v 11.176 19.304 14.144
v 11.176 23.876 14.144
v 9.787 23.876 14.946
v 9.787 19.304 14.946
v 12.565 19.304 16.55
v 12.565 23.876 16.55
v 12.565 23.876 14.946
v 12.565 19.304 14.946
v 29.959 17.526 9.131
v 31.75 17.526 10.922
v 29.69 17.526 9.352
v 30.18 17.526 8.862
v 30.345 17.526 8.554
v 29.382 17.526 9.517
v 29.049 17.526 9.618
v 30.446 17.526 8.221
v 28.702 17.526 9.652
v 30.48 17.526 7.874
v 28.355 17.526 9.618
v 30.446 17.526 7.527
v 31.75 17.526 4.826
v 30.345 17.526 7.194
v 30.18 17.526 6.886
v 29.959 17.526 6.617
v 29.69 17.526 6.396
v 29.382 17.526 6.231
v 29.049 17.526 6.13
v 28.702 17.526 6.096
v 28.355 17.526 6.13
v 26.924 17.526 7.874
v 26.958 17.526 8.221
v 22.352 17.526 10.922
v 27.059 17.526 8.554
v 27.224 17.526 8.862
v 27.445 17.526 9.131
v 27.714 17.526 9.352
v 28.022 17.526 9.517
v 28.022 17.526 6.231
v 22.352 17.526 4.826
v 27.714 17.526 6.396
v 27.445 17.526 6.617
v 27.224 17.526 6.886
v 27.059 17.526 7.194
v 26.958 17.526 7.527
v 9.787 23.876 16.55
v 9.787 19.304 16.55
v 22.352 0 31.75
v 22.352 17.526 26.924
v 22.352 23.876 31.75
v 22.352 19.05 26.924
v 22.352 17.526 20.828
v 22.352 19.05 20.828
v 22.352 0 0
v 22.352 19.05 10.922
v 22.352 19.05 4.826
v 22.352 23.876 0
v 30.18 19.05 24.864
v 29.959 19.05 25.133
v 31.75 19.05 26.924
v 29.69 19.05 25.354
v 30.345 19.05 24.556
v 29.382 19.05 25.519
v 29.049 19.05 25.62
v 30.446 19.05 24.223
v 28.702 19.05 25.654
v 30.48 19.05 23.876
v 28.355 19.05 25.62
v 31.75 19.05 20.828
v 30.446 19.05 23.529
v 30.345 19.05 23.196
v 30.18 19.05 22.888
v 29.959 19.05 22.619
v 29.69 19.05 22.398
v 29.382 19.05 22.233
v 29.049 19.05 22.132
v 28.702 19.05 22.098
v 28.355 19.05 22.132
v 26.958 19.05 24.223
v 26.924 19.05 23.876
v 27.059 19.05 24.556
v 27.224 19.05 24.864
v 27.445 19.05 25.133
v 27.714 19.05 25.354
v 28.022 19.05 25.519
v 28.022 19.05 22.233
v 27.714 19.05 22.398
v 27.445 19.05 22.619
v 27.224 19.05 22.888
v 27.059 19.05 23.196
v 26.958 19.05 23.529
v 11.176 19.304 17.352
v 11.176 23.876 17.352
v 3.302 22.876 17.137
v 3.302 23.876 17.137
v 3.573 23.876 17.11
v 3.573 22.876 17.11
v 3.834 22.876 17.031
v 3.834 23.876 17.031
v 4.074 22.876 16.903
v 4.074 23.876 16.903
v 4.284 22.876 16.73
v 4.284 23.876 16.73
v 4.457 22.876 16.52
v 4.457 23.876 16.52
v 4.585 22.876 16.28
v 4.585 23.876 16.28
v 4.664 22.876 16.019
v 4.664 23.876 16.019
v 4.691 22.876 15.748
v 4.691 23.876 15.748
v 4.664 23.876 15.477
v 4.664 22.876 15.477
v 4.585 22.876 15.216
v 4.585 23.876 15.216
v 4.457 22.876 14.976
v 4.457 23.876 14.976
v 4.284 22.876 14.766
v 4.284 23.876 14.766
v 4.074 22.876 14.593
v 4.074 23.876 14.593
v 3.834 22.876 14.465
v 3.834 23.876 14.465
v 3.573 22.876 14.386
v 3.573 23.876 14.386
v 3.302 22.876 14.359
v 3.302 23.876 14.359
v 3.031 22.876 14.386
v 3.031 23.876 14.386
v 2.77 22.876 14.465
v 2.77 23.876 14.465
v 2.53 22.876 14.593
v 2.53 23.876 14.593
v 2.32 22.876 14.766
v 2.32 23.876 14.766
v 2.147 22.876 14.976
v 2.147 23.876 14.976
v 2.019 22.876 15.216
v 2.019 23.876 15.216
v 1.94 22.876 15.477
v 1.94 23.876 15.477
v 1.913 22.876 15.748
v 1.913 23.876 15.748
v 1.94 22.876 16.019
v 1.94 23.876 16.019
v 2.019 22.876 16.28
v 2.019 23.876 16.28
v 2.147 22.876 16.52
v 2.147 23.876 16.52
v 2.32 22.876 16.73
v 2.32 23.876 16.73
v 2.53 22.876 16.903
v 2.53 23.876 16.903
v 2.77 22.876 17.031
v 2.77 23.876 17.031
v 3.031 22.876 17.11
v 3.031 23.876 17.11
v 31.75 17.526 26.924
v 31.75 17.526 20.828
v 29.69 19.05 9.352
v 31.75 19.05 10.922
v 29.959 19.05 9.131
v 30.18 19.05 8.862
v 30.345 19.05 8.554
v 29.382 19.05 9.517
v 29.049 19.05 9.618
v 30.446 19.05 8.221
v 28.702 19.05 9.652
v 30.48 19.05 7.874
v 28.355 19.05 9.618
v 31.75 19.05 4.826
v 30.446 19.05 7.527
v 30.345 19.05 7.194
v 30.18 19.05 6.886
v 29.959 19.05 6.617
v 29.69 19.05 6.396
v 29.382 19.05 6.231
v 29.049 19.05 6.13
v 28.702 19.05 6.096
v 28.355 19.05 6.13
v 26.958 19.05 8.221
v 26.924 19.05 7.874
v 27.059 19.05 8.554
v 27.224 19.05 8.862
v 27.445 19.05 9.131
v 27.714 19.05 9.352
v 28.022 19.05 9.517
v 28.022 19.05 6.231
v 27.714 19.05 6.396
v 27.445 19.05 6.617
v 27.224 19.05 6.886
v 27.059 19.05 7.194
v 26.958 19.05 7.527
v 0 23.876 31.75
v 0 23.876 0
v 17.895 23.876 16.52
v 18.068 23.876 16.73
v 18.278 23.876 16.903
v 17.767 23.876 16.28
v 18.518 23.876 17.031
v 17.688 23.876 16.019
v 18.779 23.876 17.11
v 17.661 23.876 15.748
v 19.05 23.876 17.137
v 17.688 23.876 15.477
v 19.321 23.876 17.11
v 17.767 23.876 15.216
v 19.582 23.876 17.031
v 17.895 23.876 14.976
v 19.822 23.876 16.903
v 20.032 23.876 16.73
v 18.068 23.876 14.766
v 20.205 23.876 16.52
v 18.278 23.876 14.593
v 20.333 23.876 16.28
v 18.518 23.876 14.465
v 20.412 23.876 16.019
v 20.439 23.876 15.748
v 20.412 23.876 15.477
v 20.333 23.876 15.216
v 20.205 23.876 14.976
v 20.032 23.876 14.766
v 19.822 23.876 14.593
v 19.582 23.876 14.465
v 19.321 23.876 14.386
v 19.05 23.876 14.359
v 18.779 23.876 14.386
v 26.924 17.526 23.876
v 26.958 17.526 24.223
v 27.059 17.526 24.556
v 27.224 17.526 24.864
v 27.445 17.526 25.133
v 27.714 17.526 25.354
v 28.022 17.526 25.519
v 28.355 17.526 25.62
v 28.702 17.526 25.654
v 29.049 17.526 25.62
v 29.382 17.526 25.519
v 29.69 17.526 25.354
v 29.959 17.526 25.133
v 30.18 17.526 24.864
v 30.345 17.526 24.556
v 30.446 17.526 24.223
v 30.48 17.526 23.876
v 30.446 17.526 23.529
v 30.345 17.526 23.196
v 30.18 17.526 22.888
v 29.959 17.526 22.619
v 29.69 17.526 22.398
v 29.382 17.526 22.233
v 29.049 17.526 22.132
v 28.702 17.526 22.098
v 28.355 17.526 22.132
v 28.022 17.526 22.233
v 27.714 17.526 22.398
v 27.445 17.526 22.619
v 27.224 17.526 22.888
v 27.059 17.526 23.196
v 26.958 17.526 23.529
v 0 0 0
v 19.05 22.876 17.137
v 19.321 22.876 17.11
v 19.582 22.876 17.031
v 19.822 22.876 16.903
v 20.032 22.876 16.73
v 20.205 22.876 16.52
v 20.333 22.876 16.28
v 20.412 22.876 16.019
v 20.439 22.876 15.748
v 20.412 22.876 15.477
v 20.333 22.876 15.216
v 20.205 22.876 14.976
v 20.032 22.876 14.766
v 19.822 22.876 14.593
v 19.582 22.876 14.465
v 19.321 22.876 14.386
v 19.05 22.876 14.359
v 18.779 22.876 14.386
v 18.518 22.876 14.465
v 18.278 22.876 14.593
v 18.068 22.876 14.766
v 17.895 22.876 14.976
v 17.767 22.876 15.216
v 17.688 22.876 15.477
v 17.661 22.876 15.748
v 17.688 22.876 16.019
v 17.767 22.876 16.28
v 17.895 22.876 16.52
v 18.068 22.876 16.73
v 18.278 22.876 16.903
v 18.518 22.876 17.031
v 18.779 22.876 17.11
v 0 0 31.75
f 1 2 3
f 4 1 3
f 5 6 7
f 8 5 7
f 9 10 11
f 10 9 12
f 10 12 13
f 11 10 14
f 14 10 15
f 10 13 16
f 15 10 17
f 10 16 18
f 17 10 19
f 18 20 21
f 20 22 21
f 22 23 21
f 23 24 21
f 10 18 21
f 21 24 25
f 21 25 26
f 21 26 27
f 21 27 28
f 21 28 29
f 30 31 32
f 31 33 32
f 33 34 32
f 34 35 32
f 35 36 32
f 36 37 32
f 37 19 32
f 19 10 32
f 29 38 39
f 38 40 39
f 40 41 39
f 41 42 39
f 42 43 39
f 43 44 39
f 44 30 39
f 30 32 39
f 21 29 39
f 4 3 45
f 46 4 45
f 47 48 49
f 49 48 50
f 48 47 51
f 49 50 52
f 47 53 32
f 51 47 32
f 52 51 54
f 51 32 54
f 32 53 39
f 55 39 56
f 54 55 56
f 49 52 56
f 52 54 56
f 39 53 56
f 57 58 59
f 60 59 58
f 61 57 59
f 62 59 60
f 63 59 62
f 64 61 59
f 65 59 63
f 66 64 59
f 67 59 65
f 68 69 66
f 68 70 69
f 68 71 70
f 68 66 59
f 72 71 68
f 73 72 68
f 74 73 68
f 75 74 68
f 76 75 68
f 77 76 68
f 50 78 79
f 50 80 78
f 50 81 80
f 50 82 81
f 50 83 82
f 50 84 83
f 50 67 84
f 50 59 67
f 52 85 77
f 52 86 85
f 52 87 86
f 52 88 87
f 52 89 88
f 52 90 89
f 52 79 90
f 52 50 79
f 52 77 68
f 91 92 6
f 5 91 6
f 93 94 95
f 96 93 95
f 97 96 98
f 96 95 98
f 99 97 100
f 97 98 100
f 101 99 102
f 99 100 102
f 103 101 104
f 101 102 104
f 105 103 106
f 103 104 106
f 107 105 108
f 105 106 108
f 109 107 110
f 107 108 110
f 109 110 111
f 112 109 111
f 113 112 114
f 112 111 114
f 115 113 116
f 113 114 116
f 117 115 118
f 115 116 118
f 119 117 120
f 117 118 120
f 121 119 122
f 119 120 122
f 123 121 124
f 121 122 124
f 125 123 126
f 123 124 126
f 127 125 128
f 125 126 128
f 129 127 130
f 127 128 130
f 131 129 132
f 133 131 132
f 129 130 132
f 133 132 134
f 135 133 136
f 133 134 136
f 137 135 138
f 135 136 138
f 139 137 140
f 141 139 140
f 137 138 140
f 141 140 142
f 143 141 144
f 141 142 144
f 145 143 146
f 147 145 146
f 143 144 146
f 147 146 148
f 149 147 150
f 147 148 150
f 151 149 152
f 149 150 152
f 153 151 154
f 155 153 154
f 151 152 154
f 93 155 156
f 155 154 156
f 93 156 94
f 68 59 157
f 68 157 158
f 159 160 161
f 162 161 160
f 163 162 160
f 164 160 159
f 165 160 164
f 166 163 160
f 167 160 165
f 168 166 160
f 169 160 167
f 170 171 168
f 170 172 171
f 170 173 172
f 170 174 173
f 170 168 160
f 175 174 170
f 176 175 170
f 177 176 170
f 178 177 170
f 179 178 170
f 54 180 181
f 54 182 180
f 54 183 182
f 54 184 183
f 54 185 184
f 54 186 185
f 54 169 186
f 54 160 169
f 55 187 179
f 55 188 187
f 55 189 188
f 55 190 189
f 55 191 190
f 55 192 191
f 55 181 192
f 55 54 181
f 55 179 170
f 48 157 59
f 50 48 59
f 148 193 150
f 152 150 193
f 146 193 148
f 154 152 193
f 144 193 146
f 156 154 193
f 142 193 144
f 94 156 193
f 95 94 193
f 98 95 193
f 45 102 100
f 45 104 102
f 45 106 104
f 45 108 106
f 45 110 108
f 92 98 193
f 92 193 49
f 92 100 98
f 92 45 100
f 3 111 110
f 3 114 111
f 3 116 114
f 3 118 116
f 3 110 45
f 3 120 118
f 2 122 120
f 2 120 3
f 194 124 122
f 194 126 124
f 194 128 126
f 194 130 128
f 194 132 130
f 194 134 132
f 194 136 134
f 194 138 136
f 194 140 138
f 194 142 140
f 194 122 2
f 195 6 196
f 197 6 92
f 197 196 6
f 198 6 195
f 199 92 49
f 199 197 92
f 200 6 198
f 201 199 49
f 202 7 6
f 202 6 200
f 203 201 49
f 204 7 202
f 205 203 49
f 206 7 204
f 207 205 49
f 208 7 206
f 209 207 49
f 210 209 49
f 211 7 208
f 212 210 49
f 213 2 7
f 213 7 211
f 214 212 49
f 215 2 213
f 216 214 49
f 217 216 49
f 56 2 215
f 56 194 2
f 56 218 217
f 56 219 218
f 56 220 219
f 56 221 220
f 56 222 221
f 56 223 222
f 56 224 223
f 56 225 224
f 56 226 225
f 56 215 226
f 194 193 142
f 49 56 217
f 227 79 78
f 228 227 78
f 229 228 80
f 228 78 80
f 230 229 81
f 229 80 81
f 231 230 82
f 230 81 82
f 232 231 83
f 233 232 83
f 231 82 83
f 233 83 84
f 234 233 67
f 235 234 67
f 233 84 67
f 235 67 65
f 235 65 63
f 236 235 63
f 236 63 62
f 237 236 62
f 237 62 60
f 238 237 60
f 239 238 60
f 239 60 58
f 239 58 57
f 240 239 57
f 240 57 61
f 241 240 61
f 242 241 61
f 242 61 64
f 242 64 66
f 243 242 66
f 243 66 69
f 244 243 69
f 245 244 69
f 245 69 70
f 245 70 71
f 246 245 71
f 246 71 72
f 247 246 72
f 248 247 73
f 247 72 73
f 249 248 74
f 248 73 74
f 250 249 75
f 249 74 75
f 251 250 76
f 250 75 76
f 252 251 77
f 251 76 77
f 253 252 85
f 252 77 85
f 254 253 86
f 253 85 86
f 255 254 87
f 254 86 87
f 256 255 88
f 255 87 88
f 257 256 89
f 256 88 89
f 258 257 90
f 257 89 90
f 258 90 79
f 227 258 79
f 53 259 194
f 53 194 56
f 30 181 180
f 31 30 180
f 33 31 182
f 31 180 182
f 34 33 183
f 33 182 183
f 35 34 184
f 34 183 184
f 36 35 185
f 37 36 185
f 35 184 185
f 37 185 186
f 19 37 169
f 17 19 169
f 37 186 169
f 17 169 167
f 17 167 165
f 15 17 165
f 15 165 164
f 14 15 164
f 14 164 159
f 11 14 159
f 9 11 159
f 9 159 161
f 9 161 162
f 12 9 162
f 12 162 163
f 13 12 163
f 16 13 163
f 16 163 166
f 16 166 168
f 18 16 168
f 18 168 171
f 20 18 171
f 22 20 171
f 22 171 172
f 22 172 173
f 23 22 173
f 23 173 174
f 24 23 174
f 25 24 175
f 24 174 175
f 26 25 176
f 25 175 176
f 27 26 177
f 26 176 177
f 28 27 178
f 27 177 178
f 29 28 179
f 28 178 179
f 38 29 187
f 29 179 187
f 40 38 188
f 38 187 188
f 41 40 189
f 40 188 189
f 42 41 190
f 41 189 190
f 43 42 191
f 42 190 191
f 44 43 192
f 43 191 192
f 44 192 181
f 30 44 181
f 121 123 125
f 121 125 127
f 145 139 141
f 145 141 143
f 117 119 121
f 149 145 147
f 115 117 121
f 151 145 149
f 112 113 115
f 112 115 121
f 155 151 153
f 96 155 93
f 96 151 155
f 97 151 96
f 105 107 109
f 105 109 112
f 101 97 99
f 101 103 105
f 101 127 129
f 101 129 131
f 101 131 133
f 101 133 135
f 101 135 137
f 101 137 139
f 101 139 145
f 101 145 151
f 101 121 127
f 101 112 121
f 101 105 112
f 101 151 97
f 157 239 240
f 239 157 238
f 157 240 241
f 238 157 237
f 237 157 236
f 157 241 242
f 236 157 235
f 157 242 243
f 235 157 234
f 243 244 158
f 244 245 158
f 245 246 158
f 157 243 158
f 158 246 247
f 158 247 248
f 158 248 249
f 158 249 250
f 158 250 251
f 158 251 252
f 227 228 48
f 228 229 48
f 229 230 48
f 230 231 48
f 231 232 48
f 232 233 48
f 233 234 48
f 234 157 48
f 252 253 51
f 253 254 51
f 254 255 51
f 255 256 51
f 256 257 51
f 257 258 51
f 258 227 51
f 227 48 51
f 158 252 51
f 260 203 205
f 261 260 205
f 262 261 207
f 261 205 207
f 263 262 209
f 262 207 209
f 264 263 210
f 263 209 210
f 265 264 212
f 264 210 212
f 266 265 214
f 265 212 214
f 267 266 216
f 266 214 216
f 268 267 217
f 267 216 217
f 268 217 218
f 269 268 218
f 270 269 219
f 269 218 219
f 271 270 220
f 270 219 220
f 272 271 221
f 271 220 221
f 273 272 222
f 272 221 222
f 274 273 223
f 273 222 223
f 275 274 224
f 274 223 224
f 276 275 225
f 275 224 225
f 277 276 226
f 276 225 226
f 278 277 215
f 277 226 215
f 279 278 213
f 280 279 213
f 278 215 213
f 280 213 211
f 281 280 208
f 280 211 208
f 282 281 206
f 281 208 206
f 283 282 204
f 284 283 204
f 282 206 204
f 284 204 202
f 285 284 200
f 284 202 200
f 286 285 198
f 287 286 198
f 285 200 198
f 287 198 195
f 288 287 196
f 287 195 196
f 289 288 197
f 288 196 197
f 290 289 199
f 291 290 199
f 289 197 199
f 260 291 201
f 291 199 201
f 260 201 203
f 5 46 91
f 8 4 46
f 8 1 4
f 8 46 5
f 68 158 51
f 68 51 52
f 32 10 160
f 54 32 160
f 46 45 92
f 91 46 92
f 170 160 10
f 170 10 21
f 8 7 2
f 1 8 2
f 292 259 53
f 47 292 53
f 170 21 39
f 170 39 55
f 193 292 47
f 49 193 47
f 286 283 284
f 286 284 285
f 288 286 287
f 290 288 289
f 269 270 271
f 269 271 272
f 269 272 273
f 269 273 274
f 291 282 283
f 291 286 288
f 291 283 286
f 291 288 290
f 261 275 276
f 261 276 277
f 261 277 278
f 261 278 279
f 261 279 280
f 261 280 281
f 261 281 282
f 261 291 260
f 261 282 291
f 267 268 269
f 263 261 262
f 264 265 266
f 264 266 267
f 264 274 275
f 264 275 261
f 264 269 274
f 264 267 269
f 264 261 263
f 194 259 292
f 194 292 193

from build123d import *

# Parameters (mm, degrees)
SKETCH1_W           = 22.352
SKETCH1_H           = 23.876
BOSS_EXTRUDE1_DEPTH = 31.75
CUT_EXTRUDE1_DEPTH  = 4.572
SKETCH2_3_R         = 1.3890625
CUT_EXTRUDE2_DEPTH  = 1
SKETCH4_W           = 6.096
SKETCH4_H           = 1.524
BOSS_EXTRUDE2_DEPTH = 9.398
CUT_EXTRUDE3_REACH  = 50.775
SKETCH5_R           = 1.778


with BuildPart() as part:
    # Sketch1 → Boss-Extrude1 (new body)
    with BuildSketch(Plane.XY):
        with Locations((11.176, 11.938)):
            Rectangle(SKETCH1_W, SKETCH1_H)
    extrude(amount=BOSS_EXTRUDE1_DEPTH)

    # Sketch2 → Cut-Extrude1 (cut)
    with BuildSketch(Plane(origin=(0, 23.876, 0), x_dir=(1, 0, 0), z_dir=(0, 1, 0))):
        Polygon((9.7869375, -16.549975608), (11.176, -17.351951217), (12.5650625, -16.549975608), (12.5650625, -14.946024392), (11.176, -14.144048783), (9.7869375, -14.946024392), align=None)
    extrude(amount=-CUT_EXTRUDE1_DEPTH, mode=Mode.SUBTRACT)

    # Sketch2<3> → Cut-Extrude2 (cut)
    with BuildSketch(Plane(origin=(0, 23.876, 0), x_dir=(1, 0, 0), z_dir=(0, 1, 0))):
        with Locations((3.302, -15.748)):
            Circle(SKETCH2_3_R)
        with Locations((19.05, -15.748)):
            Circle(SKETCH2_3_R)
    extrude(amount=-CUT_EXTRUDE2_DEPTH, mode=Mode.SUBTRACT)

    # Sketch4 → Boss-Extrude2 (add)
    with BuildSketch(Plane(origin=(22.352, 0, 0), x_dir=(0, 0, -1), z_dir=(1, 0, 0))):
        with Locations((-23.876, 18.288)):
            Rectangle(SKETCH4_W, SKETCH4_H)
        with Locations((-7.874, 18.288)):
            Rectangle(SKETCH4_W, SKETCH4_H)
    extrude(amount=BOSS_EXTRUDE2_DEPTH)

    # Sketch5 → Cut-Extrude3 (cut, up to next)
    with BuildSketch(Plane(origin=(0, 19.05, 0), x_dir=(1, 0, 0), z_dir=(0, 1, 0)), mode=Mode.PRIVATE) as cut_extrude3_sk1:
        with Locations((28.702, -23.876)):
            Circle(SKETCH5_R)
    cut_extrude3_tool1 = extrude(cut_extrude3_sk1.sketch, amount=-CUT_EXTRUDE3_REACH, mode=Mode.PRIVATE) & part.part
    # Sketch5 → Cut-Extrude3 (cut, up to next)
    with BuildSketch(Plane(origin=(0, 19.05, 0), x_dir=(1, 0, 0), z_dir=(0, 1, 0)), mode=Mode.PRIVATE) as cut_extrude3_sk2:
        with Locations((28.702, -7.874)):
            Circle(SKETCH5_R)
    cut_extrude3_tool2 = extrude(cut_extrude3_sk2.sketch, amount=-CUT_EXTRUDE3_REACH, mode=Mode.PRIVATE) & part.part
    add(cut_extrude3_tool1.solids().sort_by_distance((28.702, 19.05, 23.876))[0], mode=Mode.SUBTRACT)
    add(cut_extrude3_tool2.solids().sort_by_distance((28.702, 19.05, 7.874))[0], mode=Mode.SUBTRACT)


solid = part.part
